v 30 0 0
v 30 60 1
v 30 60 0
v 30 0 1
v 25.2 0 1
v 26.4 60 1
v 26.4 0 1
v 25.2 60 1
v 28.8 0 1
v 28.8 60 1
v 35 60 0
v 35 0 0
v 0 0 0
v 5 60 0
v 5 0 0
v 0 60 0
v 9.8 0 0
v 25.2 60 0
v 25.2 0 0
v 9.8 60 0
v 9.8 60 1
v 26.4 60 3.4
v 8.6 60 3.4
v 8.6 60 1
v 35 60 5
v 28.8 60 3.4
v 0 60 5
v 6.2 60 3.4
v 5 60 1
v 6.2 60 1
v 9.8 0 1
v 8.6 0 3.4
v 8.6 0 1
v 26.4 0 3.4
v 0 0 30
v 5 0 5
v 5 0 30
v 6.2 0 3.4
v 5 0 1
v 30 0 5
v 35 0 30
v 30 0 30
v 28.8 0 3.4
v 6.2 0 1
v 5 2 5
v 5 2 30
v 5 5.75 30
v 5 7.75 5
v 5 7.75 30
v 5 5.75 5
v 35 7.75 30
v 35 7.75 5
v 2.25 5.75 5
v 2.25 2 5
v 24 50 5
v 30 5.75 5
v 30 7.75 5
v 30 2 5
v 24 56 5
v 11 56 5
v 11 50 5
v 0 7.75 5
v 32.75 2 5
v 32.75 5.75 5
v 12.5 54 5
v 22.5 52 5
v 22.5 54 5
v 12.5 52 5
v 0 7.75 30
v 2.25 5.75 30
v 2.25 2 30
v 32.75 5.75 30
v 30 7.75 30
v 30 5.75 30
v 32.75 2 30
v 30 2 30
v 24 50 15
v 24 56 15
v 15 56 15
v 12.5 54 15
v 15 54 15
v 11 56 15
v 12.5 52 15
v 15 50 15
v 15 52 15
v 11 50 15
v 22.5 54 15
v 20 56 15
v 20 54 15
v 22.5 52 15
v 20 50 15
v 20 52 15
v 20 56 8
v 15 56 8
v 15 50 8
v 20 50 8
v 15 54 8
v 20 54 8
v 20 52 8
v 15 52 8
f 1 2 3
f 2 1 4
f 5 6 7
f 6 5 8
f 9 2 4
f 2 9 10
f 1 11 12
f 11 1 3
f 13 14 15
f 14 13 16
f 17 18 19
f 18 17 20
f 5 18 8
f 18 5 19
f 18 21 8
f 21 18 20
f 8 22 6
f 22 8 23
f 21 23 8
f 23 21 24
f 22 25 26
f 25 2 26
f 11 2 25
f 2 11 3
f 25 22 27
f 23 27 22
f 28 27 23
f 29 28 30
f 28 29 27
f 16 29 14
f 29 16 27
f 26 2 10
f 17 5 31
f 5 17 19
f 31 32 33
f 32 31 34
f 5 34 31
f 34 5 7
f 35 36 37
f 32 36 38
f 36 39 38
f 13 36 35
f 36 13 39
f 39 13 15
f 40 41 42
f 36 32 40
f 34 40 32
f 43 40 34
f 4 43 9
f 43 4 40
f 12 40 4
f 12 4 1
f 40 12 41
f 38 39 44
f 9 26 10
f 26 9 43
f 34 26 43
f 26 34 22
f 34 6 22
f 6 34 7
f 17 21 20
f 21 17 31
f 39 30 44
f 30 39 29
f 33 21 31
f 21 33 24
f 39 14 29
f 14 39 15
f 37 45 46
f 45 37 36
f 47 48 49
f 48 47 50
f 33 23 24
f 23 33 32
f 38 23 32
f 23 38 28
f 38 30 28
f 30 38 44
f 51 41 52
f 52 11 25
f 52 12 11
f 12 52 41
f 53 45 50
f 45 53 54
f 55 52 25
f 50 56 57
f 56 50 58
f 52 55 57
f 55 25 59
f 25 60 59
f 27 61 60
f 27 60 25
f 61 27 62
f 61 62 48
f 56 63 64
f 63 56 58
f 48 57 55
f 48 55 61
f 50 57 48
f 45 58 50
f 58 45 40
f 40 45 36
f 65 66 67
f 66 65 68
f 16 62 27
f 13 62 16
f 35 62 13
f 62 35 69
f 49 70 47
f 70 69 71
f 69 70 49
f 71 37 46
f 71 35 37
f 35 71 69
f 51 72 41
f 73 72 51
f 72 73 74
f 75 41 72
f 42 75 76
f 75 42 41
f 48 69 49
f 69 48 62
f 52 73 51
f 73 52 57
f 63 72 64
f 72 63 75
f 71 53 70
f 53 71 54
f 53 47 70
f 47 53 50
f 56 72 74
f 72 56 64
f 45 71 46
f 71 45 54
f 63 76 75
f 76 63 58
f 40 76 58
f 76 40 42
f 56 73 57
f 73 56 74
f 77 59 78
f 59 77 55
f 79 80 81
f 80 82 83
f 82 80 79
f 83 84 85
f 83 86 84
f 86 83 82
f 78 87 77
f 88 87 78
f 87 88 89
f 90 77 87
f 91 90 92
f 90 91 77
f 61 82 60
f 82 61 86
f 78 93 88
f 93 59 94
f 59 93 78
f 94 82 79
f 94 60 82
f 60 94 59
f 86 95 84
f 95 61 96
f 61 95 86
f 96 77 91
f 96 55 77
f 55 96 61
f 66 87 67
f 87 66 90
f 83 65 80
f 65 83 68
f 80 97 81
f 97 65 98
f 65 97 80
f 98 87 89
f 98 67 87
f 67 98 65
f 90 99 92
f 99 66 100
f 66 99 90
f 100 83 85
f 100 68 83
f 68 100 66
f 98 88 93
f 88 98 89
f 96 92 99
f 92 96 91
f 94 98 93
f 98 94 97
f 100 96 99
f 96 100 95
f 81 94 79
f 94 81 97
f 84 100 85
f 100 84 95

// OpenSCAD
//My 8mm camera mount has 4 parts:
//A base, on which the carriage can slide in and out toward the lens

//A carriage, which sits on top of the carriage and slides on rails made from lego wheel axles
//with a '+' shaped cross-section

//The camera mount, which sits snugly in the vertical slots of the carriage and can be adusted vertically
//The lens cover, holding the lens, and which can be fitted into the camera mount.


//This is the carriage. The small vertical slots in the rear are designed to fit a nut, 
//so that I could turn an m3 machine screw mounted in the base to fine-tune the focus.
//It didn't work very well, frankly, and I ended up just adjusting the carriage manually and 
//securing it in position with a piece of elastic.  
//If you're mechanically inclined, please share your improved design!

module channel() {
    union() {
        cube([4.8,60,1]);
        translate([1.2,0,0]) {cube([2.4,60,3.4]);}
        }
    }

difference() {
cube([35,60,5]);
translate([25.2,0,0]) {channel(); }
translate([5,0,0]) {channel(); }
}

difference(){
cube([35,7.75,30]);
translate([2.25,2,0]) {cube([30.5,3.75,30]);}
translate([5,0,0]) {cube([25,8,30]);}
}


difference(){
translate([11,50,5]){cube([13,6,10]);}
translate([12.5,52,5]){cube([10,2,10]);}
translate([15,50,8]){cube([5,6,7]);}
}
